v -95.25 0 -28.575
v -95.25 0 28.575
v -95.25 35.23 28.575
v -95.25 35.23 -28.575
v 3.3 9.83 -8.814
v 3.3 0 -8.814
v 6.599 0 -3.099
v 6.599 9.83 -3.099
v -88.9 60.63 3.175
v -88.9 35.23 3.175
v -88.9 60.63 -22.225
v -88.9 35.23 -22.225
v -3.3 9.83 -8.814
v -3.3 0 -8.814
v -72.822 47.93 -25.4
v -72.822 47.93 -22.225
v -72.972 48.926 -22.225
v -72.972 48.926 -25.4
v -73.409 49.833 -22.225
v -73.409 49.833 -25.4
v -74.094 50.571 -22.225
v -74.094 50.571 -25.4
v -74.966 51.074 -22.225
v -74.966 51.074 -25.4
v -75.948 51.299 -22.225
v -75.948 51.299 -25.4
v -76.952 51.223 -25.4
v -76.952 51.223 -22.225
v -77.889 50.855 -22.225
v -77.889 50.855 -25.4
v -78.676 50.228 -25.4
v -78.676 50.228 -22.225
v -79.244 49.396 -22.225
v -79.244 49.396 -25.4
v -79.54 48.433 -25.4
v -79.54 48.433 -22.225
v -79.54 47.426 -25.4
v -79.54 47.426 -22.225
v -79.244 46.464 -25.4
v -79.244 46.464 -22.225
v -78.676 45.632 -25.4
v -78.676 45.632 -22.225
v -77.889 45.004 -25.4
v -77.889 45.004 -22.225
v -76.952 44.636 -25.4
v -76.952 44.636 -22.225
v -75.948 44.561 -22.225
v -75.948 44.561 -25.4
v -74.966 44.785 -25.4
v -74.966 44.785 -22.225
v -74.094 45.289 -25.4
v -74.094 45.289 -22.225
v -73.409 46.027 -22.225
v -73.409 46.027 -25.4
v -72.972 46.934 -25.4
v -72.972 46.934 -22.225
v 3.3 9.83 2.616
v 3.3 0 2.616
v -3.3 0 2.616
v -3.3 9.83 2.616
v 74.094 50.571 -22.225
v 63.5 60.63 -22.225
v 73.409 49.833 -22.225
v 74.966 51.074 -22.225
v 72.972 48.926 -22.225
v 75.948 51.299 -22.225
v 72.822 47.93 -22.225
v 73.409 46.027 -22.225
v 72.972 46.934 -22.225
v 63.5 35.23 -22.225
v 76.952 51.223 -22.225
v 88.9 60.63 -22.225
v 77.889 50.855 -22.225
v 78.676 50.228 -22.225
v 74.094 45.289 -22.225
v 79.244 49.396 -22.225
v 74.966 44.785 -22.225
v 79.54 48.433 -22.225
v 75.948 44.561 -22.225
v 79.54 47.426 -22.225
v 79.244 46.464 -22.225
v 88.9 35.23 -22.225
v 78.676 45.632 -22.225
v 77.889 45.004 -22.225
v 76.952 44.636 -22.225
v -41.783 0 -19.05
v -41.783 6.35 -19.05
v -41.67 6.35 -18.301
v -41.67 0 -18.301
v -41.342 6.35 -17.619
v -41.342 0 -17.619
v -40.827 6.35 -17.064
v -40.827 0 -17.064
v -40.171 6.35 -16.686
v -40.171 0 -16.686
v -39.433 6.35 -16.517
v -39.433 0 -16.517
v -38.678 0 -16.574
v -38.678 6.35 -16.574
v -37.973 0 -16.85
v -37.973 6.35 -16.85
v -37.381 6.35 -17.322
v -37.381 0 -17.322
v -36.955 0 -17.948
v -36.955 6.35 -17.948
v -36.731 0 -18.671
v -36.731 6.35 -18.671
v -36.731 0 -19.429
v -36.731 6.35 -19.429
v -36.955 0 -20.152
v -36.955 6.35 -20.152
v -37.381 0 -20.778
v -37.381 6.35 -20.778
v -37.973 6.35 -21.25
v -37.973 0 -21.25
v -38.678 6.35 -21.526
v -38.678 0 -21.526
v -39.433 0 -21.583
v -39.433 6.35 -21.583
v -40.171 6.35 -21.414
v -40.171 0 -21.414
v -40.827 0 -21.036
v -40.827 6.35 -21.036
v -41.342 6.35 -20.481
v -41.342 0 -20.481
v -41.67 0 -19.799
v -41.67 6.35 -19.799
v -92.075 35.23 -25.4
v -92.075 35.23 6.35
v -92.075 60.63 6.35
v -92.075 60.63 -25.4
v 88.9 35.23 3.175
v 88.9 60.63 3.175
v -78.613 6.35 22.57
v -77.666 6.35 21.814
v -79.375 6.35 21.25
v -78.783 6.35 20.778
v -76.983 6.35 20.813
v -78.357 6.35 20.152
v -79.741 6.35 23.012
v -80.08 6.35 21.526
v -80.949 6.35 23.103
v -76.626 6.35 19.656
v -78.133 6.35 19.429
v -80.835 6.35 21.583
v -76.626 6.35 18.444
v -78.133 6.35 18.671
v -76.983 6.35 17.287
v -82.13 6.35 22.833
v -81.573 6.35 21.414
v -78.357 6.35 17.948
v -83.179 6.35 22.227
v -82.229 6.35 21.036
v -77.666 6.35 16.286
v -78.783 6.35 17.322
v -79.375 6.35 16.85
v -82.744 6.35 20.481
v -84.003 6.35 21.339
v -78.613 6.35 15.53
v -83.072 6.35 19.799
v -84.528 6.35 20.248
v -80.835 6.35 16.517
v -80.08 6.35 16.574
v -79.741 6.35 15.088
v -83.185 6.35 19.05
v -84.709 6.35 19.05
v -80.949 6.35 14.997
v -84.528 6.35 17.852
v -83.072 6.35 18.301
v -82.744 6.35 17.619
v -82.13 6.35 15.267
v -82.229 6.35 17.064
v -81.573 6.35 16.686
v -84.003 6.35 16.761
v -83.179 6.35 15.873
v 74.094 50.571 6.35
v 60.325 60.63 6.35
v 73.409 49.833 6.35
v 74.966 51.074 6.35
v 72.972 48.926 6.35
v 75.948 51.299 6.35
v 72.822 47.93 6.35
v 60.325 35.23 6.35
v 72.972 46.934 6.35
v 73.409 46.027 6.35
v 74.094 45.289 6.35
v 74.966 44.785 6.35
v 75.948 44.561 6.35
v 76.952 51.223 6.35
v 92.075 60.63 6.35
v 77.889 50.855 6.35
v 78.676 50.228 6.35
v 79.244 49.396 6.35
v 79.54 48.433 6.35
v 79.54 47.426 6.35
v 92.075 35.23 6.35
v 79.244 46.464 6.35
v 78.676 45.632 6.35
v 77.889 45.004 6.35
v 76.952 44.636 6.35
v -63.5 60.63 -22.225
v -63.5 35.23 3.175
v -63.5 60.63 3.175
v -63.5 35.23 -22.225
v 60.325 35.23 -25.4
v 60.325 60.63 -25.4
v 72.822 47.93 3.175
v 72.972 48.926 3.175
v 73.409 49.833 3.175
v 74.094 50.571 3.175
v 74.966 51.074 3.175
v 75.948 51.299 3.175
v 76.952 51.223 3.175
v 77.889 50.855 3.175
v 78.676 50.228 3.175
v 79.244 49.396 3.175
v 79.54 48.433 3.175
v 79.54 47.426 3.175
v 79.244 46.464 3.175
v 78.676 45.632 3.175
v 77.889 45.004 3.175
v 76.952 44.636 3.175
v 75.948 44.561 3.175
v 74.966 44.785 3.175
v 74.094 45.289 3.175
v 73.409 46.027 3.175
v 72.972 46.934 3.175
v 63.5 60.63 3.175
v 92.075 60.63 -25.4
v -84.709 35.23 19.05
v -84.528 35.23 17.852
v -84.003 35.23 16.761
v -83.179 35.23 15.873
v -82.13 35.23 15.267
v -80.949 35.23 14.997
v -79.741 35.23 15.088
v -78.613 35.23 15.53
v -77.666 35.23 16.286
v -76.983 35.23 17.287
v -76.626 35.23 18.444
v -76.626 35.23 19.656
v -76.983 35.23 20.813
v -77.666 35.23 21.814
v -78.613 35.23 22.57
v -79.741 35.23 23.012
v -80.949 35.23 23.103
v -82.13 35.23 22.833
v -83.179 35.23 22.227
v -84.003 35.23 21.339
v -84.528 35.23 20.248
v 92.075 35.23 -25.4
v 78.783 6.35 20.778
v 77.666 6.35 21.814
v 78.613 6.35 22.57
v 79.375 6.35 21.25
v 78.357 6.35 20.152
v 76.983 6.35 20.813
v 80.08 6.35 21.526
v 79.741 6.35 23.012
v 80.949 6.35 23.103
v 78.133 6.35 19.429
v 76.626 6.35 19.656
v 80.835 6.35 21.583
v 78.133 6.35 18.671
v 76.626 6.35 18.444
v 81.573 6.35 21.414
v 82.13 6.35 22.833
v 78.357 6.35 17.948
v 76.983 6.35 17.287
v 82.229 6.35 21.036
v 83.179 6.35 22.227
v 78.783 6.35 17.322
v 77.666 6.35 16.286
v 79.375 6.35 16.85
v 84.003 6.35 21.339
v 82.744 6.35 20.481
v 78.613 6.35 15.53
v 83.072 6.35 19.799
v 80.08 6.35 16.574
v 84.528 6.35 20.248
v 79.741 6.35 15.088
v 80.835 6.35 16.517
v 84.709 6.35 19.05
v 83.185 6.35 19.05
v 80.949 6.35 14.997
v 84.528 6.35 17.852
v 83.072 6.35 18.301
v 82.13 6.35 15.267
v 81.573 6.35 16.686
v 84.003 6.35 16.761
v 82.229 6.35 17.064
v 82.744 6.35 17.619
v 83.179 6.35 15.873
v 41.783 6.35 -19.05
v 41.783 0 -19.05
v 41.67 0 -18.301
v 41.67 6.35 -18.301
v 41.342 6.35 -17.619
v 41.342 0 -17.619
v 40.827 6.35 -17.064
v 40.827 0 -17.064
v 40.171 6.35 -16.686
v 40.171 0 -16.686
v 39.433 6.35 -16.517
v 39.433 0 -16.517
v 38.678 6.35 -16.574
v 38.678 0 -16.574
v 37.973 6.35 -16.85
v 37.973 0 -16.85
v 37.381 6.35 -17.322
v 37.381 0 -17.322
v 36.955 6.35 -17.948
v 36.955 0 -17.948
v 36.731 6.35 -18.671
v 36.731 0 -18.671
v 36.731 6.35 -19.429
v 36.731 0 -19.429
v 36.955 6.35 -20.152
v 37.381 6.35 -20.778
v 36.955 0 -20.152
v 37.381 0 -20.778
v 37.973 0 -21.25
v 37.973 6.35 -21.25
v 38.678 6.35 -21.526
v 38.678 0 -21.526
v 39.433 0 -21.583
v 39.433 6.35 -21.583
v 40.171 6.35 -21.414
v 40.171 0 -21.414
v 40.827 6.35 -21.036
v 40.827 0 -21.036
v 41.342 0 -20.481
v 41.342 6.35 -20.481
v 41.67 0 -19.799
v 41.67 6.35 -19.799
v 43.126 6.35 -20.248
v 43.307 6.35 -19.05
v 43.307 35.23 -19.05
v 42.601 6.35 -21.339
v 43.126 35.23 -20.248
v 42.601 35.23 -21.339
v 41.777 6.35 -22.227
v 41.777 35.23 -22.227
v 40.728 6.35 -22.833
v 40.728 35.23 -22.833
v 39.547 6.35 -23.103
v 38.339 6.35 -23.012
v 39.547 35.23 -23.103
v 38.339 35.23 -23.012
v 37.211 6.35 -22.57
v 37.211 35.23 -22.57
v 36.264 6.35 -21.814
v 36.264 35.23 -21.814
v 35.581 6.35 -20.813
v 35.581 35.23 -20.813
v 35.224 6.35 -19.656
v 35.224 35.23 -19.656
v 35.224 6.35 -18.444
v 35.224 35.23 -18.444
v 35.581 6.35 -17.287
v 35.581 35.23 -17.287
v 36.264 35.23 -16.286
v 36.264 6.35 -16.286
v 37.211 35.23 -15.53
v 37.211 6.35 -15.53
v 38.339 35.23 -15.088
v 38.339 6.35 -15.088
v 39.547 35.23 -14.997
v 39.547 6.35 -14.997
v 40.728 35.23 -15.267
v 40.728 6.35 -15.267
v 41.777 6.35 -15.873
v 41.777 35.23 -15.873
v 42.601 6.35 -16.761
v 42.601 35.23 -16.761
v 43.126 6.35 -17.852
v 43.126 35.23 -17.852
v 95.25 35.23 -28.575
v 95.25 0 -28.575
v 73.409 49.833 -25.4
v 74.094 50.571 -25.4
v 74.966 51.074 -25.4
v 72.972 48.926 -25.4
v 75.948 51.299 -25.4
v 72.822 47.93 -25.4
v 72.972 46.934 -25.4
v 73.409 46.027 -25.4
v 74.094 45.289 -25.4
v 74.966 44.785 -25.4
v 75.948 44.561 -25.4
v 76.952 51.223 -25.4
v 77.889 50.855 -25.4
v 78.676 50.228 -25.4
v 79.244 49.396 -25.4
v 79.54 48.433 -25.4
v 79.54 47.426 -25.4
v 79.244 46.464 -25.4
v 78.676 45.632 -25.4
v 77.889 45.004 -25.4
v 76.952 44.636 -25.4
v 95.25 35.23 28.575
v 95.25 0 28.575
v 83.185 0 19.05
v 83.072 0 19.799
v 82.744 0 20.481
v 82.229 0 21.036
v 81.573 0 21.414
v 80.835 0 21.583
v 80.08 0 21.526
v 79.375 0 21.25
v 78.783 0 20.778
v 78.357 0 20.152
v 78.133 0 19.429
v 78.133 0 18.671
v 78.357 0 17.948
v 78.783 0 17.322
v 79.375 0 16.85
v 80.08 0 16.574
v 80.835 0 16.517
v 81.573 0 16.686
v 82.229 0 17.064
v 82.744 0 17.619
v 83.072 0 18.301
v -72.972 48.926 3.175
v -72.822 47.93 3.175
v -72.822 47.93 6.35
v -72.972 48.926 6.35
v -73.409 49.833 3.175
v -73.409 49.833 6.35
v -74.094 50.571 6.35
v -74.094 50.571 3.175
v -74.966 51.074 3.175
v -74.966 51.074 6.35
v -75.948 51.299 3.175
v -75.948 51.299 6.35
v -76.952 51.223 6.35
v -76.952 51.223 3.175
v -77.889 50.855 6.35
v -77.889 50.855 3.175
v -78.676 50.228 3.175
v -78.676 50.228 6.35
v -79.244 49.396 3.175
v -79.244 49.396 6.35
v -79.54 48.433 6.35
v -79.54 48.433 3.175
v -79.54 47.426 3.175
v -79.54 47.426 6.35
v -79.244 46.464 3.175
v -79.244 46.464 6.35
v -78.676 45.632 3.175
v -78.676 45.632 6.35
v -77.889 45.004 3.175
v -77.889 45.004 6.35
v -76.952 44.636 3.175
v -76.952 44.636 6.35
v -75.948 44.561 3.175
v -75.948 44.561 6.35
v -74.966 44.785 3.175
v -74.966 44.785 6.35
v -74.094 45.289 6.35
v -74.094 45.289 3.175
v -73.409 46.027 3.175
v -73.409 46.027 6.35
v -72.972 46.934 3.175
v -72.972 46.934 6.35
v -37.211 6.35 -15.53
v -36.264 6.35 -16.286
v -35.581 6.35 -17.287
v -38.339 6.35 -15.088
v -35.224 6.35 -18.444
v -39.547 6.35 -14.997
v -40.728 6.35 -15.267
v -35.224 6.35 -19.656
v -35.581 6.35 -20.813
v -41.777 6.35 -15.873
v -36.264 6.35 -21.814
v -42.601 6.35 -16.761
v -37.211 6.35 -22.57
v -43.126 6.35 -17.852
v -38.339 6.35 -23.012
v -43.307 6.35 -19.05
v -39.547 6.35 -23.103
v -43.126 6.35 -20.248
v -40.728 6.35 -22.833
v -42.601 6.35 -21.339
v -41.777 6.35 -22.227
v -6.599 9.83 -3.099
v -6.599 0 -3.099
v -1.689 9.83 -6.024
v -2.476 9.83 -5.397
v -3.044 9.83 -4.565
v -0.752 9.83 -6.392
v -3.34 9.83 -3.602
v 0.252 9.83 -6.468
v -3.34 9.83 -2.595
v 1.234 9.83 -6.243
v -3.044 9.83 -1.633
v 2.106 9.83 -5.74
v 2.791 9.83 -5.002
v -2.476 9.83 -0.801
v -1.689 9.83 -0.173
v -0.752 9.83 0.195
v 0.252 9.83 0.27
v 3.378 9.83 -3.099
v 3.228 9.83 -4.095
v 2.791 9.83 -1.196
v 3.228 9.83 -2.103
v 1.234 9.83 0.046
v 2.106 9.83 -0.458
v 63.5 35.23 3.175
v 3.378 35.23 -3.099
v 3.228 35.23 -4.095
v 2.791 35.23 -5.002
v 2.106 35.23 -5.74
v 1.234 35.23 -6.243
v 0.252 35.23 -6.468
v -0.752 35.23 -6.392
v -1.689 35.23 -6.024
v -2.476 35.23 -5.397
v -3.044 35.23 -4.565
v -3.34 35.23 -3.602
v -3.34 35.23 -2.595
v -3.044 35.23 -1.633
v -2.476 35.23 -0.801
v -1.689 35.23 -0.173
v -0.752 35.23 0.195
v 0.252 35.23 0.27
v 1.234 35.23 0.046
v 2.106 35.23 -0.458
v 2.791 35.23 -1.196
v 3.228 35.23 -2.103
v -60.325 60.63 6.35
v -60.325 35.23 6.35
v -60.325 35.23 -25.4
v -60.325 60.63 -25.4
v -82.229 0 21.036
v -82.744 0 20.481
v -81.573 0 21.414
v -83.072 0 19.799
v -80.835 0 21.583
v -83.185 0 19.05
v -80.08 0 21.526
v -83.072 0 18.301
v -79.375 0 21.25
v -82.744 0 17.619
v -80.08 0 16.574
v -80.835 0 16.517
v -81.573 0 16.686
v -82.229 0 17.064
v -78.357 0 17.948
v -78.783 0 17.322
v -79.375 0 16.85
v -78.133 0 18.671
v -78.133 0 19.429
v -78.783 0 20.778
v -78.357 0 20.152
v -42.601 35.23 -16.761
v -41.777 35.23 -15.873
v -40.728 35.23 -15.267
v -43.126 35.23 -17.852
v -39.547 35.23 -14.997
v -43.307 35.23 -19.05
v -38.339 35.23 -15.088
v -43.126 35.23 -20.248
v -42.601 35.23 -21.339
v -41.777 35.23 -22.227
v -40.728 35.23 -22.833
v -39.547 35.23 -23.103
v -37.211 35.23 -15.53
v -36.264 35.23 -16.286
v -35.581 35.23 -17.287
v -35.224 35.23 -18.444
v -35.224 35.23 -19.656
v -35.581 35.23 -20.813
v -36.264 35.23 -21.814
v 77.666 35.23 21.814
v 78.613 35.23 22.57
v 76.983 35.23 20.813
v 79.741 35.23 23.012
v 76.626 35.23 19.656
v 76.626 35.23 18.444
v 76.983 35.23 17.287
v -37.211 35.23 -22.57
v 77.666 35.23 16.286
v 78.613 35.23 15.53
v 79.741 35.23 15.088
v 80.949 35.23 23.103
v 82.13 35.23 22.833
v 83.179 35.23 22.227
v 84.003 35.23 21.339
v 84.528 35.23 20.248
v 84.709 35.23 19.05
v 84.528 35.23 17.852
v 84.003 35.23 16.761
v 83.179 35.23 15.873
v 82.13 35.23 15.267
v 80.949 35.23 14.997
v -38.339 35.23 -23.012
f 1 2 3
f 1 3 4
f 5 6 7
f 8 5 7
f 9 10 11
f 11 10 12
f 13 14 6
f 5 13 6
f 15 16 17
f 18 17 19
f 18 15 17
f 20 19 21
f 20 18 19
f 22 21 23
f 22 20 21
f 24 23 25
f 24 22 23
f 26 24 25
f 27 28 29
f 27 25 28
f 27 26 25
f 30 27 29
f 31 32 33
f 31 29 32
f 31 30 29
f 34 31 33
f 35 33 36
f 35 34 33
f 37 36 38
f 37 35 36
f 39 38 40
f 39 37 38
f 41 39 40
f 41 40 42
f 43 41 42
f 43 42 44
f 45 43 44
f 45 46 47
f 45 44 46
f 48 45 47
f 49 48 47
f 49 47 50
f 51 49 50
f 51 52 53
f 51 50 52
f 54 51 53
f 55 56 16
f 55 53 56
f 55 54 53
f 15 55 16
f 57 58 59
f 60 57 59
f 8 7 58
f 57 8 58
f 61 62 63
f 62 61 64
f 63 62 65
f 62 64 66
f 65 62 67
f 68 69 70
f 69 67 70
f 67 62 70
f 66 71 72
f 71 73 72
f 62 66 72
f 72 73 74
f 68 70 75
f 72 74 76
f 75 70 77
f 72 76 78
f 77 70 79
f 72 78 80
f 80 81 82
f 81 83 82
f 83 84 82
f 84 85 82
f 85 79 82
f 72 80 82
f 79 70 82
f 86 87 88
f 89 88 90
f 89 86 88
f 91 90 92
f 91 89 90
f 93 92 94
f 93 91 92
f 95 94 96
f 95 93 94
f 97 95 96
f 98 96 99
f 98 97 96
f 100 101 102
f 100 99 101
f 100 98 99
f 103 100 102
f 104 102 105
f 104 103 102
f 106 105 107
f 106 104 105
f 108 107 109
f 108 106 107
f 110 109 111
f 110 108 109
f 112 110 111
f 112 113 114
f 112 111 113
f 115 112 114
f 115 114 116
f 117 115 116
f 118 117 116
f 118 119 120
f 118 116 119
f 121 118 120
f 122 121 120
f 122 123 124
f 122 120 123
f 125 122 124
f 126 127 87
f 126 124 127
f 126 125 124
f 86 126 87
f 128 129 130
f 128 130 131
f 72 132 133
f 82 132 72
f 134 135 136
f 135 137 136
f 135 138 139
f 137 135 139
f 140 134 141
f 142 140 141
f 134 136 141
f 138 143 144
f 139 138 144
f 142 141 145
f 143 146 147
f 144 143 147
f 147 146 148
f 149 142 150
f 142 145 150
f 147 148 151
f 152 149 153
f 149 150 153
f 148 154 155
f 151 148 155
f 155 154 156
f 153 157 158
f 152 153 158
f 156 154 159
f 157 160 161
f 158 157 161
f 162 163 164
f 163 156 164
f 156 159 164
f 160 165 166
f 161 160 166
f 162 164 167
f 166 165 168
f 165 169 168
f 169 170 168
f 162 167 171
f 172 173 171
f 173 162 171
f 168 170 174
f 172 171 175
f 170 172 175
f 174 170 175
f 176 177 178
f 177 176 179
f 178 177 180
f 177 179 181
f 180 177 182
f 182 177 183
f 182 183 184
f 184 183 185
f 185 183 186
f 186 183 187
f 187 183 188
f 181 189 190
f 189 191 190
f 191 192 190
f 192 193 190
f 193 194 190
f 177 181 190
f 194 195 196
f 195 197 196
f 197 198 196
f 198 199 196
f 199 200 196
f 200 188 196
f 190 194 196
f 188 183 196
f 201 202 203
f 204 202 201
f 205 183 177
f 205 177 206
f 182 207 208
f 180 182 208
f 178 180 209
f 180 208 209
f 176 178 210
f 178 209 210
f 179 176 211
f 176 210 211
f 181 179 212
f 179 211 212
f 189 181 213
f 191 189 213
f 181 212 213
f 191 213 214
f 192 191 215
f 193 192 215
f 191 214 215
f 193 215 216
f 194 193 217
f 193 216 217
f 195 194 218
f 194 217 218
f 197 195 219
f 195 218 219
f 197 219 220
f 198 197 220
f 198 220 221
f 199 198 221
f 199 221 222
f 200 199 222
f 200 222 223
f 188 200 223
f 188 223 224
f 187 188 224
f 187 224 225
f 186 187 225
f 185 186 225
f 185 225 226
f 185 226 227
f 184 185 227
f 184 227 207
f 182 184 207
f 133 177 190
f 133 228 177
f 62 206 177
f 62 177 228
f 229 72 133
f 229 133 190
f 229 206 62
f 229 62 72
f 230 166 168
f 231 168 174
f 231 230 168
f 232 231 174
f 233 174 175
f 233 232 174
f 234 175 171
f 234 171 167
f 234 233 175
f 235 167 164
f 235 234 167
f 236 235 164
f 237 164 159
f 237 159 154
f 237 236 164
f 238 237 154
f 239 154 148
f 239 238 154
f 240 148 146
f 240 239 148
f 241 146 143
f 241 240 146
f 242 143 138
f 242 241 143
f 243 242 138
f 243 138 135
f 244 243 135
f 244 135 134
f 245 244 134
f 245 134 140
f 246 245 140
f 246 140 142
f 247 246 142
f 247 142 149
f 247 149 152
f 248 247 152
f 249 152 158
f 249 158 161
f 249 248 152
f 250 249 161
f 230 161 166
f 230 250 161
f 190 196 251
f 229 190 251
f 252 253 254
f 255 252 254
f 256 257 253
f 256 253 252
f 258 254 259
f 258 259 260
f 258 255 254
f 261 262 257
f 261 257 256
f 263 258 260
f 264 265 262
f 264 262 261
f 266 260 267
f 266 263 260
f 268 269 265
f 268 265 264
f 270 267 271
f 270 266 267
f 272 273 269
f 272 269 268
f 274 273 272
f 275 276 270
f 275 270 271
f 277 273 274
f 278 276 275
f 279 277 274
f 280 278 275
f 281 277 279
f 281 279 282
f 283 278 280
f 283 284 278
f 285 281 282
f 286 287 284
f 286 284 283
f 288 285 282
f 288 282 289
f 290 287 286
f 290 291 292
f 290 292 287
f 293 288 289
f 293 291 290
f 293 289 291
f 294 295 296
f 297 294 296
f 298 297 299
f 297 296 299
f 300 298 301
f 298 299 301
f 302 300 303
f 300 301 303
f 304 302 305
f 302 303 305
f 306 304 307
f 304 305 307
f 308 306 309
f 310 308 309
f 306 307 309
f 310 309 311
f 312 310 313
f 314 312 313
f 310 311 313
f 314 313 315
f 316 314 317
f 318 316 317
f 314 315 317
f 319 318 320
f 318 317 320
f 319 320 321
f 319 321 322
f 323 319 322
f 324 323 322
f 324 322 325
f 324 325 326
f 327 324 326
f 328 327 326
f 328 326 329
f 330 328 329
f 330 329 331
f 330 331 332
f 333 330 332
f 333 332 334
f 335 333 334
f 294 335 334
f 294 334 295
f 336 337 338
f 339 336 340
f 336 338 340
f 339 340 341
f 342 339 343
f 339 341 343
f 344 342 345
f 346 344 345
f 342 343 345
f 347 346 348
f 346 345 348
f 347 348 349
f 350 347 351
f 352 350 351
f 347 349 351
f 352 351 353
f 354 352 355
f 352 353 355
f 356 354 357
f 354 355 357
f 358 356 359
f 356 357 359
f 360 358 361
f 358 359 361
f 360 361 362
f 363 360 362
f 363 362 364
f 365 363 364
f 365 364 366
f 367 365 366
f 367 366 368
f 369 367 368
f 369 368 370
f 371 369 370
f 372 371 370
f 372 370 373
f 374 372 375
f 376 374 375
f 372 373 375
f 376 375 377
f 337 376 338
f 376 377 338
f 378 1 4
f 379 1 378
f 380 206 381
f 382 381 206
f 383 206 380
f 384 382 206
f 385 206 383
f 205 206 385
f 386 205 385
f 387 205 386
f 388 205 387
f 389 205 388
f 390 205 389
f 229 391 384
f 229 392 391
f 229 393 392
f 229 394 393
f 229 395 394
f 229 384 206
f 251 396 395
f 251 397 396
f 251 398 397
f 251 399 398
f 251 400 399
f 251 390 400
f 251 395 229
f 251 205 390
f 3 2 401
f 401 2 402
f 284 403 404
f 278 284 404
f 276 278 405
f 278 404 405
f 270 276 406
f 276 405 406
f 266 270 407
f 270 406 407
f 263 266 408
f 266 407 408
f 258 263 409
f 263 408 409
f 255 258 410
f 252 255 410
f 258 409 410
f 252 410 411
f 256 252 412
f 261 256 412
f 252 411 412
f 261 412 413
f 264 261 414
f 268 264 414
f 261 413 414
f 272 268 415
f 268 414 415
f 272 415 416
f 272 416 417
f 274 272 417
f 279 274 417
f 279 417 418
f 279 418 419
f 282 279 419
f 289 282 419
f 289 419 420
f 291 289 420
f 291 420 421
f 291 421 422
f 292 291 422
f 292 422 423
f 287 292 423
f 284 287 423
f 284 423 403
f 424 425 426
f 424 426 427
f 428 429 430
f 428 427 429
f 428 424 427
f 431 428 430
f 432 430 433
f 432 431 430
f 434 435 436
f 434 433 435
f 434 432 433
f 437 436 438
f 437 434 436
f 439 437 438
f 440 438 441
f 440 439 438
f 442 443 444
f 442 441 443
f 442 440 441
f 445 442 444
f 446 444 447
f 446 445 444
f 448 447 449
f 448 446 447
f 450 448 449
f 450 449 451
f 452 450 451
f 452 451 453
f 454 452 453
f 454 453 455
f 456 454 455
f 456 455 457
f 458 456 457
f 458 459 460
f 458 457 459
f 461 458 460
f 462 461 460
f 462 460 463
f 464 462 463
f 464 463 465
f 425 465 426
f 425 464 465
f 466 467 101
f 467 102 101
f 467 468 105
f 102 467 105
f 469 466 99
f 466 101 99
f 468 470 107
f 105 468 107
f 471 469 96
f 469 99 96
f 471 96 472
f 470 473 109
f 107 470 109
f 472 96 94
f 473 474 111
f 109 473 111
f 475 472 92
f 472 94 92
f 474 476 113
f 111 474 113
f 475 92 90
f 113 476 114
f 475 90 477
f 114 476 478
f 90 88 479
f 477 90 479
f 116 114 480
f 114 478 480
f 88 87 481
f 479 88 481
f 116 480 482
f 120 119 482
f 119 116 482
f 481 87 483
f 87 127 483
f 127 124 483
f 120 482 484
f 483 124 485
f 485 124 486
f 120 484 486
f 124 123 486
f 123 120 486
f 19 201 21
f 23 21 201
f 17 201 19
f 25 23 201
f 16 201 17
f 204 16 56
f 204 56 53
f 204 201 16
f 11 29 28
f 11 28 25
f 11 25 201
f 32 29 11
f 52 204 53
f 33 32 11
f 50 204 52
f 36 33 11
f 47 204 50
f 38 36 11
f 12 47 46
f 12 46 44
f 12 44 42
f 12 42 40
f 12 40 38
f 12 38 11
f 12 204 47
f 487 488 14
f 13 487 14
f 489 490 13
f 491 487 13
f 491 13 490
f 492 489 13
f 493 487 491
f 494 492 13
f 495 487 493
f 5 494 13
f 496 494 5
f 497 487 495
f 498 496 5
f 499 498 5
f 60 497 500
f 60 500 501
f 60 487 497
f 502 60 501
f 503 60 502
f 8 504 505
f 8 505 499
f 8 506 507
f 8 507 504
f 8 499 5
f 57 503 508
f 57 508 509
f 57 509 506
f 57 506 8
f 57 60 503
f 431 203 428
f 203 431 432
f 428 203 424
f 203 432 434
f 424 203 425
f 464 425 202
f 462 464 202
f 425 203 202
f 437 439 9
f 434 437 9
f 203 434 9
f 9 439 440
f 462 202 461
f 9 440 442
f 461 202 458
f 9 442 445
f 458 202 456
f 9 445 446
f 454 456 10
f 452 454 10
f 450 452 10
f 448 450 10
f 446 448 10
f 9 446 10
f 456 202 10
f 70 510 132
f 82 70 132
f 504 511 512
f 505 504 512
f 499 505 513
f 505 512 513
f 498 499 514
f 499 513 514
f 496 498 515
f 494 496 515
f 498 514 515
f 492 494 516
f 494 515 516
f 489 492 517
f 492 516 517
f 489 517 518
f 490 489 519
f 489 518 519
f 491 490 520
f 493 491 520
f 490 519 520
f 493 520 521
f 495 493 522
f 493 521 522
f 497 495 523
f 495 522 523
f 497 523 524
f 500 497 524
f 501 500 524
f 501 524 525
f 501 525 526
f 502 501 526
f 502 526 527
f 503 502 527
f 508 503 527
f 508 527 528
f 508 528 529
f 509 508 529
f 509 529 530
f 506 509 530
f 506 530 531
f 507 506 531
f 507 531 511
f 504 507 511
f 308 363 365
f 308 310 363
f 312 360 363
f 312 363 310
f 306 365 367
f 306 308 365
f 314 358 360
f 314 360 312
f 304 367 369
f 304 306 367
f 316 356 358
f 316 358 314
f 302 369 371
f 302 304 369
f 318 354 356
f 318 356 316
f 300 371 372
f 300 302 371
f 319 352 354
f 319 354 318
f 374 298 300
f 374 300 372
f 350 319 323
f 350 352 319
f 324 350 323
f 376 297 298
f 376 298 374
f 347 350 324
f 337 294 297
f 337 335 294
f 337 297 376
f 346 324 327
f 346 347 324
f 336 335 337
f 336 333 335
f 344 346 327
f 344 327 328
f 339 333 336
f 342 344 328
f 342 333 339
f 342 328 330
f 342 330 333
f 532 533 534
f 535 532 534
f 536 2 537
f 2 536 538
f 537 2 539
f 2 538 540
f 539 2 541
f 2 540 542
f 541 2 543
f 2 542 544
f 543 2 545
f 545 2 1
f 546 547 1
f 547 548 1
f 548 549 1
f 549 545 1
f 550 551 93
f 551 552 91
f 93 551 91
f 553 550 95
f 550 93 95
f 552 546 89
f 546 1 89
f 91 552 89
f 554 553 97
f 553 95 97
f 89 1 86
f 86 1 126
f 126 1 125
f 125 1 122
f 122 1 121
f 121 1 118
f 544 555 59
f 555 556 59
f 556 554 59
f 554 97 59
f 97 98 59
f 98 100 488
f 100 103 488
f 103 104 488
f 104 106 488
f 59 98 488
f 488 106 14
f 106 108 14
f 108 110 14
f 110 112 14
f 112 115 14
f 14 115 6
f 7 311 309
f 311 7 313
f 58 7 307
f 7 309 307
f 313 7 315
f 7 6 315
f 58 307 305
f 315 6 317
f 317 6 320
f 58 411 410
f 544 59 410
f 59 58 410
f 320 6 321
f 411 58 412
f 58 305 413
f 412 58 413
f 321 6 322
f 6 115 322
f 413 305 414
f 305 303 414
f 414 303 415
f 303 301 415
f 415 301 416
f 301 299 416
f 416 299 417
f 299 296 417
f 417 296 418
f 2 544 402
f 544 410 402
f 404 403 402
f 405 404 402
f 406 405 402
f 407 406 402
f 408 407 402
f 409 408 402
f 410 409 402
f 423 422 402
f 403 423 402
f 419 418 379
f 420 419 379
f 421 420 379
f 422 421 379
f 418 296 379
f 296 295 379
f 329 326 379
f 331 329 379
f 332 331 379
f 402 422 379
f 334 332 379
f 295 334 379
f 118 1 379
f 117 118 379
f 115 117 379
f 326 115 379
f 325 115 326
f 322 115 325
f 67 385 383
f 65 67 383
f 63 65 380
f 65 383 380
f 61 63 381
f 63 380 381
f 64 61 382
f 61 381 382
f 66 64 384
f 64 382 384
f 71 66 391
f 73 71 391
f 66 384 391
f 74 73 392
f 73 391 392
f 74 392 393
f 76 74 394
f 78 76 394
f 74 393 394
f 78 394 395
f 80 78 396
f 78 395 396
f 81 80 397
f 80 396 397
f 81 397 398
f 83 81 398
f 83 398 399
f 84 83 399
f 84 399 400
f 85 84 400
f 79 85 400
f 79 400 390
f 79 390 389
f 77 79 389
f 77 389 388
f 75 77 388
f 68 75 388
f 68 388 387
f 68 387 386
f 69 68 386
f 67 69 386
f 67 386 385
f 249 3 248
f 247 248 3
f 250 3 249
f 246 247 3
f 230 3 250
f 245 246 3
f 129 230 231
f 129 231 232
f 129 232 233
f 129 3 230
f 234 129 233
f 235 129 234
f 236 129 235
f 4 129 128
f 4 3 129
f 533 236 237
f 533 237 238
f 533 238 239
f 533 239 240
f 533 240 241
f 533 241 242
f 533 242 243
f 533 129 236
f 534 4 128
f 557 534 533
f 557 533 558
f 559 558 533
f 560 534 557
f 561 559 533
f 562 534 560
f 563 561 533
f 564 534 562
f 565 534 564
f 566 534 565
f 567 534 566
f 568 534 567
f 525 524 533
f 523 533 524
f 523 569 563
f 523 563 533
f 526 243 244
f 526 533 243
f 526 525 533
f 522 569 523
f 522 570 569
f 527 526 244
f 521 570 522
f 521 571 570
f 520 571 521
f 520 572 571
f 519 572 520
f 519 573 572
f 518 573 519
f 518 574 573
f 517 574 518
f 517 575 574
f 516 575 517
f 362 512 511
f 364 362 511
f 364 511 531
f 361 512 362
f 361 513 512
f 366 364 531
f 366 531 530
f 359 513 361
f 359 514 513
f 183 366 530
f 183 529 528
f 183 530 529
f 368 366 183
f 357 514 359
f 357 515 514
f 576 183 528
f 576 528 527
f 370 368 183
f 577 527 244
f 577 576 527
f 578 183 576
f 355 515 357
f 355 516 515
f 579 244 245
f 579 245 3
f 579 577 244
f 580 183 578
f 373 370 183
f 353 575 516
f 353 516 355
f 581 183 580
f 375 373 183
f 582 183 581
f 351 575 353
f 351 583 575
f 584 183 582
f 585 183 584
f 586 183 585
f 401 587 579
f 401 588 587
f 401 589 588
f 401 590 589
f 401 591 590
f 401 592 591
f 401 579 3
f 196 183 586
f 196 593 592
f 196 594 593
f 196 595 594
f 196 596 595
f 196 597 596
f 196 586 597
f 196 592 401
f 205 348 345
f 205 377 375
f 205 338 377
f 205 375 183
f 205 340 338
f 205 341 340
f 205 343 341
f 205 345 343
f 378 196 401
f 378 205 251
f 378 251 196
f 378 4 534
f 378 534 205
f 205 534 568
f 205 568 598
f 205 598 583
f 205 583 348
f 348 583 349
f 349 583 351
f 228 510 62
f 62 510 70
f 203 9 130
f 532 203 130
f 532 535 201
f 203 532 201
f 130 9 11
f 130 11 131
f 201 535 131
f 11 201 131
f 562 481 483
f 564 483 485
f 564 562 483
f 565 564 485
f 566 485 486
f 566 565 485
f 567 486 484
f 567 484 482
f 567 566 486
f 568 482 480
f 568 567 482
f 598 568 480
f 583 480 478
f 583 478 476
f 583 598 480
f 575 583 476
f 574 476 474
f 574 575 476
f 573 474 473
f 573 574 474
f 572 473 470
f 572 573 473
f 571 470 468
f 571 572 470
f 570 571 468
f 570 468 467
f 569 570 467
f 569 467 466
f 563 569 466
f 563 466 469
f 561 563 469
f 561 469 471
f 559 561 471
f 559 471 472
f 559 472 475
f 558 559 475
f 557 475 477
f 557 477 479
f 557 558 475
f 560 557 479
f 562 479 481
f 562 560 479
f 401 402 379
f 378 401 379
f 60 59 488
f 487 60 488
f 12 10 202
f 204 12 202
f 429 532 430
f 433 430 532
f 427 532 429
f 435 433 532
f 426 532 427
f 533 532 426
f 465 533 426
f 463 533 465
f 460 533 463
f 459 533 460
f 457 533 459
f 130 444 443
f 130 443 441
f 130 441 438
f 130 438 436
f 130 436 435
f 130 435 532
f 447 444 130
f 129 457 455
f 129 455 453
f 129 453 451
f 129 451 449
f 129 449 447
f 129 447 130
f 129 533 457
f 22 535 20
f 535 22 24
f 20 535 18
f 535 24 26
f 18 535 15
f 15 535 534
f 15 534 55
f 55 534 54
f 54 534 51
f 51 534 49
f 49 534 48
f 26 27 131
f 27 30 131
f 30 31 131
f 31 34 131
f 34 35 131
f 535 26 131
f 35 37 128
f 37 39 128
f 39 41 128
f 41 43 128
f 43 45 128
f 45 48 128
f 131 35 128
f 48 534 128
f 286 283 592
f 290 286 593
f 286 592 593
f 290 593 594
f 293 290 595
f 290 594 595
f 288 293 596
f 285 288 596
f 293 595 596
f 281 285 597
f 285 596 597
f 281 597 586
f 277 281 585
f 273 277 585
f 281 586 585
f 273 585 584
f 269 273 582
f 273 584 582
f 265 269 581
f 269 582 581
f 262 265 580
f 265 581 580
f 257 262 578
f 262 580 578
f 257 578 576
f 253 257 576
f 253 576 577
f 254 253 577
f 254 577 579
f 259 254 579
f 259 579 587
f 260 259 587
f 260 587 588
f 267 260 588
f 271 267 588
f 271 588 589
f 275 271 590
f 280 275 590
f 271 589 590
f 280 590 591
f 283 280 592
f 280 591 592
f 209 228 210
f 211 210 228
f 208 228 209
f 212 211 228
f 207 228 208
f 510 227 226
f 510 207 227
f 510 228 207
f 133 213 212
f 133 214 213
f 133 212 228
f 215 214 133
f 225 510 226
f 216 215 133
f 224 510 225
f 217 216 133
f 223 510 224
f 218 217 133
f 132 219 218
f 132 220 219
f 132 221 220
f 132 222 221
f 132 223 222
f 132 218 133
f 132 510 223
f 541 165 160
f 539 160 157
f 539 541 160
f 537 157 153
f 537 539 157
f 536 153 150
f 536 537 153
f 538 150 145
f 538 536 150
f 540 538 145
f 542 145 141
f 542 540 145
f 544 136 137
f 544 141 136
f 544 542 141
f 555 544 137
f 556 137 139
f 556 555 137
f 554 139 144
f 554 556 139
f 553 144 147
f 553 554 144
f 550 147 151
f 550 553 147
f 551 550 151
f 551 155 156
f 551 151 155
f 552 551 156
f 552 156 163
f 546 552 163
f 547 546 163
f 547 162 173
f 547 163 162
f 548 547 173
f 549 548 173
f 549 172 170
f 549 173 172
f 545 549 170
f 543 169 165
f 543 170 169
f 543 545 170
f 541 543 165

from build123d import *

# Parameters (mm, degrees)
SKETCH1_W           = 190.5
SKETCH1_H           = 57.15
BOSS_EXTRUDE1_DEPTH = 35.2298
SKETCH2_R           = 3.3782
CUT_EXTRUDE1_DEPTH  = 35.2298
SKETCH3_W           = 31.75
SKETCH3_H           = 31.75
SKETCH3_W_2         = 25.4
SKETCH3_H_2         = 25.4
BOSS_EXTRUDE2_DEPTH = 25.4
SKETCH4_R           = 3.3782
CUT_EXTRUDE2_DEPTH  = 54.975
SKETCH5_R           = 2.54
CUT_EXTRUDE3_DEPTH  = 35.2298
SKETCH6_R           = 4.064
CUT_EXTRUDE4_DEPTH  = 28.8798
CUT_EXTRUDE5_DEPTH  = 9.8298


with BuildPart() as part:
    # Sketch1 → Boss-Extrude1 (new body)
    with BuildSketch(Plane(origin=(0, 0, 0), x_dir=(1, 0, 0), z_dir=(0, 1, 0))):
        Rectangle(SKETCH1_W, SKETCH1_H)
    extrude(amount=BOSS_EXTRUDE1_DEPTH)

    # Sketch2 → Cut-Extrude1 (cut)
    with BuildSketch(Plane(origin=(0, 35.2298, 0), x_dir=(1, 0, 0), z_dir=(0, 1, 0))):
        with Locations((0, 3.0988)):
            Circle(SKETCH2_R)
    extrude(amount=-CUT_EXTRUDE1_DEPTH, mode=Mode.SUBTRACT)

    # Sketch3 → Boss-Extrude2 (add)
    with BuildSketch(Plane(origin=(0, 35.2298, 0), x_dir=(1, 0, 0), z_dir=(0, 1, 0))):
        with Locations((76.2, 9.525)):
            Rectangle(SKETCH3_W, SKETCH3_H)
        with Locations((76.2, 9.525)):
            Rectangle(SKETCH3_W_2, SKETCH3_H_2, mode=Mode.SUBTRACT)
    boss_extrude2 = extrude(amount=BOSS_EXTRUDE2_DEPTH)

    # Sketch4 → Cut-Extrude2 (cut, through all)
    with BuildSketch(Plane(origin=(0, 0, -25.4), x_dir=(-1, 0, 0), z_dir=(0, 0, -1))):
        with Locations((-76.2, 47.9298)):
            Circle(SKETCH4_R)
    cut_extrude2 = extrude(amount=-CUT_EXTRUDE2_DEPTH, mode=Mode.SUBTRACT)

    # Sketch5 → Cut-Extrude3 (cut)
    with BuildSketch(Plane.XZ):
        with Locations((80.645, 19.05)):
            Circle(SKETCH5_R)
        with Locations((39.243, -19.05)):
            Circle(SKETCH5_R)
    cut_extrude3 = extrude(amount=-CUT_EXTRUDE3_DEPTH, mode=Mode.SUBTRACT)

    # Sketch6 → Cut-Extrude4 (cut)
    with BuildSketch(Plane(origin=(0, 35.2298, 0), x_dir=(1, 0, 0), z_dir=(0, 1, 0))):
        with Locations((80.645, -19.05)):
            Circle(SKETCH6_R)
        with Locations((39.243, 19.05)):
            Circle(SKETCH6_R)
    cut_extrude4 = extrude(amount=-CUT_EXTRUDE4_DEPTH, mode=Mode.SUBTRACT)

    # Mirror1: Boss-Extrude2, Cut-Extrude2, Cut-Extrude3, Cut-Extrude4 across plane
    add(boss_extrude2.mirror(Plane(origin=(0, 0, 0), x_dir=(0, 0, 1), z_dir=(1, 0, 0))))
    add(cut_extrude2.mirror(Plane(origin=(0, 0, 0), x_dir=(0, 0, 1), z_dir=(1, 0, 0))), mode=Mode.SUBTRACT)
    add(cut_extrude3.mirror(Plane(origin=(0, 0, 0), x_dir=(0, 0, 1), z_dir=(1, 0, 0))), mode=Mode.SUBTRACT)
    add(cut_extrude4.mirror(Plane(origin=(0, 0, 0), x_dir=(0, 0, 1), z_dir=(1, 0, 0))), mode=Mode.SUBTRACT)

    # Sketch7 → Cut-Extrude5 (cut)
    with BuildSketch(Plane.XZ):
        Polygon((6.599113577, -3.0988), (3.299556788, 2.6162), (-3.299556788, 2.6162), (-6.599113577, -3.0988), (-3.299556788, -8.8138), (3.299556788, -8.8138), align=None)
    extrude(amount=-CUT_EXTRUDE5_DEPTH, mode=Mode.SUBTRACT)


solid = part.part
